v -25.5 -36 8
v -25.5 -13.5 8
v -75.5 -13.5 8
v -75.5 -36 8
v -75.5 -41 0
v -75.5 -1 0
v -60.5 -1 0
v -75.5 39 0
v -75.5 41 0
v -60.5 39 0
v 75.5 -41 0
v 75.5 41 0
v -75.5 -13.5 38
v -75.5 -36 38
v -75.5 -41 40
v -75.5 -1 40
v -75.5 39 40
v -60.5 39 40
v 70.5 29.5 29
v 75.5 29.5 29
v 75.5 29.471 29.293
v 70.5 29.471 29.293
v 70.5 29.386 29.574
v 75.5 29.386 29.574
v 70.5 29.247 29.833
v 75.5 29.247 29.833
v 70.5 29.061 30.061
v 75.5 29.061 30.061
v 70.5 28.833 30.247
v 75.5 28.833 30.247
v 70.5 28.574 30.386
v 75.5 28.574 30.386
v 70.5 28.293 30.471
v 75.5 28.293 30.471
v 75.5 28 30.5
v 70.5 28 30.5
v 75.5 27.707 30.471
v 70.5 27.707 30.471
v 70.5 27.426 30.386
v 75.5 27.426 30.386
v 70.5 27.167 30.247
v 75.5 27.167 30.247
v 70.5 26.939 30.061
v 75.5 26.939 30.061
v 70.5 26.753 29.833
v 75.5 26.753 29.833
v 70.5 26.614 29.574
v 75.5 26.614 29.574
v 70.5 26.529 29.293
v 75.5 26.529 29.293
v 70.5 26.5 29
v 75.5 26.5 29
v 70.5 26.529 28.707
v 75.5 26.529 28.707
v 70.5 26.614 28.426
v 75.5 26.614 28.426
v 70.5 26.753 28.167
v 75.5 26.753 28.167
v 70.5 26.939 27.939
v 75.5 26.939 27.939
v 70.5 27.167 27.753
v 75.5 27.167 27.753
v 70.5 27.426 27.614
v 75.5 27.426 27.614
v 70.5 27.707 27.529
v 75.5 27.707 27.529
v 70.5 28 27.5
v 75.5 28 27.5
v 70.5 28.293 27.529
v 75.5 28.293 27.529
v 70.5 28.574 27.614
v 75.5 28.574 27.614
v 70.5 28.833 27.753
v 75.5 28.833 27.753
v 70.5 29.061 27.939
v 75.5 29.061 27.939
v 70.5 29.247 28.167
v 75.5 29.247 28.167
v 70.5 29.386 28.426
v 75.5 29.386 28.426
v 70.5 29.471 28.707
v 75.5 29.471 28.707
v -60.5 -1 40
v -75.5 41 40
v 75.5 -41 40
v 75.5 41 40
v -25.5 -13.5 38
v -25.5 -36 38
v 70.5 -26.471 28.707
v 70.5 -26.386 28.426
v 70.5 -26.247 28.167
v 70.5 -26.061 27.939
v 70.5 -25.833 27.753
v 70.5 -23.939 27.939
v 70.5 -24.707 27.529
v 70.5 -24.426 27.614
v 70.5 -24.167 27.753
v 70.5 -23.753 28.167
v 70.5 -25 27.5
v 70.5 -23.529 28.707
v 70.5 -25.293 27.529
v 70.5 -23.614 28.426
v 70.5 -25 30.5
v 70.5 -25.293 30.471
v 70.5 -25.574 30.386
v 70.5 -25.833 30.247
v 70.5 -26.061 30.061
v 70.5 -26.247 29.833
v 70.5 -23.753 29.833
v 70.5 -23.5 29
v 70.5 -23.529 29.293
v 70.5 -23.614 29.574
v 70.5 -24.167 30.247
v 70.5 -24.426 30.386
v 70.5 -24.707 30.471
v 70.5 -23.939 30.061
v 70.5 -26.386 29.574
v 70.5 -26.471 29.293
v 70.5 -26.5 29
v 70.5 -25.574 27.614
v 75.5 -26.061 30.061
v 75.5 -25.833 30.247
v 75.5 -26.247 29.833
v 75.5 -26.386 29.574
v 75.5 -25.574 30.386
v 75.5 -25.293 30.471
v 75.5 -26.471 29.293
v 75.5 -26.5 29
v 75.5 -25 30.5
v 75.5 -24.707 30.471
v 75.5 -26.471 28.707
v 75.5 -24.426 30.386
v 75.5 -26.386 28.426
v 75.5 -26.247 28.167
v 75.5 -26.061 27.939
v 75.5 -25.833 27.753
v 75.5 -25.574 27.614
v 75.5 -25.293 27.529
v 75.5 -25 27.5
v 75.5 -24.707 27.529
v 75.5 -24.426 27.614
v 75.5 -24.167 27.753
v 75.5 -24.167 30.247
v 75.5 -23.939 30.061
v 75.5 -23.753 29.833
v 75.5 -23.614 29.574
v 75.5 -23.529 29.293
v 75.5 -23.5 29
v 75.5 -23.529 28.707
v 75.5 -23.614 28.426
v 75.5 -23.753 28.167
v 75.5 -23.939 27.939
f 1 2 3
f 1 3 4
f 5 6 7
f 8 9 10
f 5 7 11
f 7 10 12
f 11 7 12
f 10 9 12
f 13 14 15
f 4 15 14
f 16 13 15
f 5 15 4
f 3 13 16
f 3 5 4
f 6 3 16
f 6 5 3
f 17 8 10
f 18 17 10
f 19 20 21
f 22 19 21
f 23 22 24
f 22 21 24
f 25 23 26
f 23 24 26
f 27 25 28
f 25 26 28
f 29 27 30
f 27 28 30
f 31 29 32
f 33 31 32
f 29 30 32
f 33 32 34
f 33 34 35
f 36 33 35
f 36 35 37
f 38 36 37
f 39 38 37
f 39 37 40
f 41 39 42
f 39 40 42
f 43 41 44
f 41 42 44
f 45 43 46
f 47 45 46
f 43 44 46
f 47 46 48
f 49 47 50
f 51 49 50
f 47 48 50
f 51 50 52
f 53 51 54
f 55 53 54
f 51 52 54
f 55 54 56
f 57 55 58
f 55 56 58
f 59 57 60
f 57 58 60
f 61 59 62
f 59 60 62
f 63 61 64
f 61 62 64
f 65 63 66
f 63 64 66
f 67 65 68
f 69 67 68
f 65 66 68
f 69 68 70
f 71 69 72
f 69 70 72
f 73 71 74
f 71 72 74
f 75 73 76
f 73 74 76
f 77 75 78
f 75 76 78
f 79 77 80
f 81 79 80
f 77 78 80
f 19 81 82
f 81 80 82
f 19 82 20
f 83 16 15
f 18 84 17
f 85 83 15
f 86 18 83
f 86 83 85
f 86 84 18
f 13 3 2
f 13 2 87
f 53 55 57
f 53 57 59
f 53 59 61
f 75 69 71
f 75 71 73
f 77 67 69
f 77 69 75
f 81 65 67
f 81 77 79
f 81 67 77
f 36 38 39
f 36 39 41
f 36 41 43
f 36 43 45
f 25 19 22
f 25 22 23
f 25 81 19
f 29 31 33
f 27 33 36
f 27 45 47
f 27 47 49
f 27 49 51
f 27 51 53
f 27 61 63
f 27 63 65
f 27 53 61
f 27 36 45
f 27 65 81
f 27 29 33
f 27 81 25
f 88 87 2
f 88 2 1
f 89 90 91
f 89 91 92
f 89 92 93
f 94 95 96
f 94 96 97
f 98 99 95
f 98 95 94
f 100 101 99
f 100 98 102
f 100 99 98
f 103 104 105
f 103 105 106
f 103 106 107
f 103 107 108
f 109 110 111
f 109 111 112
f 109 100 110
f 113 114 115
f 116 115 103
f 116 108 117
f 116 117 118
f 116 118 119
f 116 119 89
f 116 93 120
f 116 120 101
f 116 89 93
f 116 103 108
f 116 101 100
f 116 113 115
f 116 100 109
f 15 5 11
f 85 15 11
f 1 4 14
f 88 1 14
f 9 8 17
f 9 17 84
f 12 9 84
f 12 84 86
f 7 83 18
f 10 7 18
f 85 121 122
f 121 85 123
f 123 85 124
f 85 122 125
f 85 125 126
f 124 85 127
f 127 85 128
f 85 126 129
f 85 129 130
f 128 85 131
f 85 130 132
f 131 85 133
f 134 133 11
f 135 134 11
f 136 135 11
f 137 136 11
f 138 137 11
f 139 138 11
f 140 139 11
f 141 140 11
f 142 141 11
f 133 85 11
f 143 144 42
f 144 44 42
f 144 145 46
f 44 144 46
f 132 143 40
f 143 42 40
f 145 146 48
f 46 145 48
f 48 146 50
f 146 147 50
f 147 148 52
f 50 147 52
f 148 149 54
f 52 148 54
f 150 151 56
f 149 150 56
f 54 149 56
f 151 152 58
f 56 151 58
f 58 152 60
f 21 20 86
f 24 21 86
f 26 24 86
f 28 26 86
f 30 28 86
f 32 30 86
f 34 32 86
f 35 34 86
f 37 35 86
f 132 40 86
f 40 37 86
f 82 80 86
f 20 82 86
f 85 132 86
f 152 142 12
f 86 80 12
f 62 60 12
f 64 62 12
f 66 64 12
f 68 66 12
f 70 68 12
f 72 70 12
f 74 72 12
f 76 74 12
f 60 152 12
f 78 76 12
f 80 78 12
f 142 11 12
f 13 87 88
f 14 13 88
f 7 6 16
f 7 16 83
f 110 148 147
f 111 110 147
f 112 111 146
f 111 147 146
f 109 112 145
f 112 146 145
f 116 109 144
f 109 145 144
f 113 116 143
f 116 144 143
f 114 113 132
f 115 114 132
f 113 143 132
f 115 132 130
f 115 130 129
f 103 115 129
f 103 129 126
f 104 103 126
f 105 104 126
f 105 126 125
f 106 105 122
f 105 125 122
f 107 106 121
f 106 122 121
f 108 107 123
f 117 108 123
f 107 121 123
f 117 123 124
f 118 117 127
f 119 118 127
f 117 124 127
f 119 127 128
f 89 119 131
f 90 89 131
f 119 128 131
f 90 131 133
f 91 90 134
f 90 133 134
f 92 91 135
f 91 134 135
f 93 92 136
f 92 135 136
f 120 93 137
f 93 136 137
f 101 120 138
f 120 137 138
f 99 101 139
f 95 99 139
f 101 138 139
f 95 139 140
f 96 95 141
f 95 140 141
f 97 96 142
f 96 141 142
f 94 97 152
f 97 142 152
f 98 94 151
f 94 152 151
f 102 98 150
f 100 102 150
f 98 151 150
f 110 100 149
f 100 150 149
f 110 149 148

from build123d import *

# Parameters (mm, degrees)
F0_W     = 151
F0_H     = 82
F1_DEPTH = 40
F2_W     = 15
F2_H     = 40
F3_DEPTH = 41
F4_W     = 22.5
F4_H     = 30
F5_DEPTH = 50
F6_R     = 1.5
F7_DEPTH = 5


with BuildPart() as f1:
    # F0 (on Top) → F1 (new body)
    with BuildSketch(Plane.XY):
        Rectangle(F0_W, F0_H)
    extrude(amount=F1_DEPTH)

    # F2 (on face) → F3 (cut)
    with BuildSketch(Plane.XY.offset(40)):
        with Locations((-68, 19)):
            Rectangle(F2_W, F2_H)
    extrude(amount=-F3_DEPTH, mode=Mode.SUBTRACT)

    # F4 (on face) → F5 (cut)
    with BuildSketch(Plane(origin=(-75.5, 0, 0), x_dir=(0, -1, 0), z_dir=(-1, 0, 0))):
        with Locations((24.75, 23)):
            Rectangle(F4_W, F4_H)
    extrude(amount=-F5_DEPTH, mode=Mode.SUBTRACT)

    # F6 (on face) → F7 (cut)
    with BuildSketch(Plane.YZ.offset(75.5)):
        with Locations((-25, 29)):
            Circle(F6_R)
        with Locations((28, 29)):
            Circle(F6_R)
    extrude(amount=-F7_DEPTH, mode=Mode.SUBTRACT)


solid = f1.part
